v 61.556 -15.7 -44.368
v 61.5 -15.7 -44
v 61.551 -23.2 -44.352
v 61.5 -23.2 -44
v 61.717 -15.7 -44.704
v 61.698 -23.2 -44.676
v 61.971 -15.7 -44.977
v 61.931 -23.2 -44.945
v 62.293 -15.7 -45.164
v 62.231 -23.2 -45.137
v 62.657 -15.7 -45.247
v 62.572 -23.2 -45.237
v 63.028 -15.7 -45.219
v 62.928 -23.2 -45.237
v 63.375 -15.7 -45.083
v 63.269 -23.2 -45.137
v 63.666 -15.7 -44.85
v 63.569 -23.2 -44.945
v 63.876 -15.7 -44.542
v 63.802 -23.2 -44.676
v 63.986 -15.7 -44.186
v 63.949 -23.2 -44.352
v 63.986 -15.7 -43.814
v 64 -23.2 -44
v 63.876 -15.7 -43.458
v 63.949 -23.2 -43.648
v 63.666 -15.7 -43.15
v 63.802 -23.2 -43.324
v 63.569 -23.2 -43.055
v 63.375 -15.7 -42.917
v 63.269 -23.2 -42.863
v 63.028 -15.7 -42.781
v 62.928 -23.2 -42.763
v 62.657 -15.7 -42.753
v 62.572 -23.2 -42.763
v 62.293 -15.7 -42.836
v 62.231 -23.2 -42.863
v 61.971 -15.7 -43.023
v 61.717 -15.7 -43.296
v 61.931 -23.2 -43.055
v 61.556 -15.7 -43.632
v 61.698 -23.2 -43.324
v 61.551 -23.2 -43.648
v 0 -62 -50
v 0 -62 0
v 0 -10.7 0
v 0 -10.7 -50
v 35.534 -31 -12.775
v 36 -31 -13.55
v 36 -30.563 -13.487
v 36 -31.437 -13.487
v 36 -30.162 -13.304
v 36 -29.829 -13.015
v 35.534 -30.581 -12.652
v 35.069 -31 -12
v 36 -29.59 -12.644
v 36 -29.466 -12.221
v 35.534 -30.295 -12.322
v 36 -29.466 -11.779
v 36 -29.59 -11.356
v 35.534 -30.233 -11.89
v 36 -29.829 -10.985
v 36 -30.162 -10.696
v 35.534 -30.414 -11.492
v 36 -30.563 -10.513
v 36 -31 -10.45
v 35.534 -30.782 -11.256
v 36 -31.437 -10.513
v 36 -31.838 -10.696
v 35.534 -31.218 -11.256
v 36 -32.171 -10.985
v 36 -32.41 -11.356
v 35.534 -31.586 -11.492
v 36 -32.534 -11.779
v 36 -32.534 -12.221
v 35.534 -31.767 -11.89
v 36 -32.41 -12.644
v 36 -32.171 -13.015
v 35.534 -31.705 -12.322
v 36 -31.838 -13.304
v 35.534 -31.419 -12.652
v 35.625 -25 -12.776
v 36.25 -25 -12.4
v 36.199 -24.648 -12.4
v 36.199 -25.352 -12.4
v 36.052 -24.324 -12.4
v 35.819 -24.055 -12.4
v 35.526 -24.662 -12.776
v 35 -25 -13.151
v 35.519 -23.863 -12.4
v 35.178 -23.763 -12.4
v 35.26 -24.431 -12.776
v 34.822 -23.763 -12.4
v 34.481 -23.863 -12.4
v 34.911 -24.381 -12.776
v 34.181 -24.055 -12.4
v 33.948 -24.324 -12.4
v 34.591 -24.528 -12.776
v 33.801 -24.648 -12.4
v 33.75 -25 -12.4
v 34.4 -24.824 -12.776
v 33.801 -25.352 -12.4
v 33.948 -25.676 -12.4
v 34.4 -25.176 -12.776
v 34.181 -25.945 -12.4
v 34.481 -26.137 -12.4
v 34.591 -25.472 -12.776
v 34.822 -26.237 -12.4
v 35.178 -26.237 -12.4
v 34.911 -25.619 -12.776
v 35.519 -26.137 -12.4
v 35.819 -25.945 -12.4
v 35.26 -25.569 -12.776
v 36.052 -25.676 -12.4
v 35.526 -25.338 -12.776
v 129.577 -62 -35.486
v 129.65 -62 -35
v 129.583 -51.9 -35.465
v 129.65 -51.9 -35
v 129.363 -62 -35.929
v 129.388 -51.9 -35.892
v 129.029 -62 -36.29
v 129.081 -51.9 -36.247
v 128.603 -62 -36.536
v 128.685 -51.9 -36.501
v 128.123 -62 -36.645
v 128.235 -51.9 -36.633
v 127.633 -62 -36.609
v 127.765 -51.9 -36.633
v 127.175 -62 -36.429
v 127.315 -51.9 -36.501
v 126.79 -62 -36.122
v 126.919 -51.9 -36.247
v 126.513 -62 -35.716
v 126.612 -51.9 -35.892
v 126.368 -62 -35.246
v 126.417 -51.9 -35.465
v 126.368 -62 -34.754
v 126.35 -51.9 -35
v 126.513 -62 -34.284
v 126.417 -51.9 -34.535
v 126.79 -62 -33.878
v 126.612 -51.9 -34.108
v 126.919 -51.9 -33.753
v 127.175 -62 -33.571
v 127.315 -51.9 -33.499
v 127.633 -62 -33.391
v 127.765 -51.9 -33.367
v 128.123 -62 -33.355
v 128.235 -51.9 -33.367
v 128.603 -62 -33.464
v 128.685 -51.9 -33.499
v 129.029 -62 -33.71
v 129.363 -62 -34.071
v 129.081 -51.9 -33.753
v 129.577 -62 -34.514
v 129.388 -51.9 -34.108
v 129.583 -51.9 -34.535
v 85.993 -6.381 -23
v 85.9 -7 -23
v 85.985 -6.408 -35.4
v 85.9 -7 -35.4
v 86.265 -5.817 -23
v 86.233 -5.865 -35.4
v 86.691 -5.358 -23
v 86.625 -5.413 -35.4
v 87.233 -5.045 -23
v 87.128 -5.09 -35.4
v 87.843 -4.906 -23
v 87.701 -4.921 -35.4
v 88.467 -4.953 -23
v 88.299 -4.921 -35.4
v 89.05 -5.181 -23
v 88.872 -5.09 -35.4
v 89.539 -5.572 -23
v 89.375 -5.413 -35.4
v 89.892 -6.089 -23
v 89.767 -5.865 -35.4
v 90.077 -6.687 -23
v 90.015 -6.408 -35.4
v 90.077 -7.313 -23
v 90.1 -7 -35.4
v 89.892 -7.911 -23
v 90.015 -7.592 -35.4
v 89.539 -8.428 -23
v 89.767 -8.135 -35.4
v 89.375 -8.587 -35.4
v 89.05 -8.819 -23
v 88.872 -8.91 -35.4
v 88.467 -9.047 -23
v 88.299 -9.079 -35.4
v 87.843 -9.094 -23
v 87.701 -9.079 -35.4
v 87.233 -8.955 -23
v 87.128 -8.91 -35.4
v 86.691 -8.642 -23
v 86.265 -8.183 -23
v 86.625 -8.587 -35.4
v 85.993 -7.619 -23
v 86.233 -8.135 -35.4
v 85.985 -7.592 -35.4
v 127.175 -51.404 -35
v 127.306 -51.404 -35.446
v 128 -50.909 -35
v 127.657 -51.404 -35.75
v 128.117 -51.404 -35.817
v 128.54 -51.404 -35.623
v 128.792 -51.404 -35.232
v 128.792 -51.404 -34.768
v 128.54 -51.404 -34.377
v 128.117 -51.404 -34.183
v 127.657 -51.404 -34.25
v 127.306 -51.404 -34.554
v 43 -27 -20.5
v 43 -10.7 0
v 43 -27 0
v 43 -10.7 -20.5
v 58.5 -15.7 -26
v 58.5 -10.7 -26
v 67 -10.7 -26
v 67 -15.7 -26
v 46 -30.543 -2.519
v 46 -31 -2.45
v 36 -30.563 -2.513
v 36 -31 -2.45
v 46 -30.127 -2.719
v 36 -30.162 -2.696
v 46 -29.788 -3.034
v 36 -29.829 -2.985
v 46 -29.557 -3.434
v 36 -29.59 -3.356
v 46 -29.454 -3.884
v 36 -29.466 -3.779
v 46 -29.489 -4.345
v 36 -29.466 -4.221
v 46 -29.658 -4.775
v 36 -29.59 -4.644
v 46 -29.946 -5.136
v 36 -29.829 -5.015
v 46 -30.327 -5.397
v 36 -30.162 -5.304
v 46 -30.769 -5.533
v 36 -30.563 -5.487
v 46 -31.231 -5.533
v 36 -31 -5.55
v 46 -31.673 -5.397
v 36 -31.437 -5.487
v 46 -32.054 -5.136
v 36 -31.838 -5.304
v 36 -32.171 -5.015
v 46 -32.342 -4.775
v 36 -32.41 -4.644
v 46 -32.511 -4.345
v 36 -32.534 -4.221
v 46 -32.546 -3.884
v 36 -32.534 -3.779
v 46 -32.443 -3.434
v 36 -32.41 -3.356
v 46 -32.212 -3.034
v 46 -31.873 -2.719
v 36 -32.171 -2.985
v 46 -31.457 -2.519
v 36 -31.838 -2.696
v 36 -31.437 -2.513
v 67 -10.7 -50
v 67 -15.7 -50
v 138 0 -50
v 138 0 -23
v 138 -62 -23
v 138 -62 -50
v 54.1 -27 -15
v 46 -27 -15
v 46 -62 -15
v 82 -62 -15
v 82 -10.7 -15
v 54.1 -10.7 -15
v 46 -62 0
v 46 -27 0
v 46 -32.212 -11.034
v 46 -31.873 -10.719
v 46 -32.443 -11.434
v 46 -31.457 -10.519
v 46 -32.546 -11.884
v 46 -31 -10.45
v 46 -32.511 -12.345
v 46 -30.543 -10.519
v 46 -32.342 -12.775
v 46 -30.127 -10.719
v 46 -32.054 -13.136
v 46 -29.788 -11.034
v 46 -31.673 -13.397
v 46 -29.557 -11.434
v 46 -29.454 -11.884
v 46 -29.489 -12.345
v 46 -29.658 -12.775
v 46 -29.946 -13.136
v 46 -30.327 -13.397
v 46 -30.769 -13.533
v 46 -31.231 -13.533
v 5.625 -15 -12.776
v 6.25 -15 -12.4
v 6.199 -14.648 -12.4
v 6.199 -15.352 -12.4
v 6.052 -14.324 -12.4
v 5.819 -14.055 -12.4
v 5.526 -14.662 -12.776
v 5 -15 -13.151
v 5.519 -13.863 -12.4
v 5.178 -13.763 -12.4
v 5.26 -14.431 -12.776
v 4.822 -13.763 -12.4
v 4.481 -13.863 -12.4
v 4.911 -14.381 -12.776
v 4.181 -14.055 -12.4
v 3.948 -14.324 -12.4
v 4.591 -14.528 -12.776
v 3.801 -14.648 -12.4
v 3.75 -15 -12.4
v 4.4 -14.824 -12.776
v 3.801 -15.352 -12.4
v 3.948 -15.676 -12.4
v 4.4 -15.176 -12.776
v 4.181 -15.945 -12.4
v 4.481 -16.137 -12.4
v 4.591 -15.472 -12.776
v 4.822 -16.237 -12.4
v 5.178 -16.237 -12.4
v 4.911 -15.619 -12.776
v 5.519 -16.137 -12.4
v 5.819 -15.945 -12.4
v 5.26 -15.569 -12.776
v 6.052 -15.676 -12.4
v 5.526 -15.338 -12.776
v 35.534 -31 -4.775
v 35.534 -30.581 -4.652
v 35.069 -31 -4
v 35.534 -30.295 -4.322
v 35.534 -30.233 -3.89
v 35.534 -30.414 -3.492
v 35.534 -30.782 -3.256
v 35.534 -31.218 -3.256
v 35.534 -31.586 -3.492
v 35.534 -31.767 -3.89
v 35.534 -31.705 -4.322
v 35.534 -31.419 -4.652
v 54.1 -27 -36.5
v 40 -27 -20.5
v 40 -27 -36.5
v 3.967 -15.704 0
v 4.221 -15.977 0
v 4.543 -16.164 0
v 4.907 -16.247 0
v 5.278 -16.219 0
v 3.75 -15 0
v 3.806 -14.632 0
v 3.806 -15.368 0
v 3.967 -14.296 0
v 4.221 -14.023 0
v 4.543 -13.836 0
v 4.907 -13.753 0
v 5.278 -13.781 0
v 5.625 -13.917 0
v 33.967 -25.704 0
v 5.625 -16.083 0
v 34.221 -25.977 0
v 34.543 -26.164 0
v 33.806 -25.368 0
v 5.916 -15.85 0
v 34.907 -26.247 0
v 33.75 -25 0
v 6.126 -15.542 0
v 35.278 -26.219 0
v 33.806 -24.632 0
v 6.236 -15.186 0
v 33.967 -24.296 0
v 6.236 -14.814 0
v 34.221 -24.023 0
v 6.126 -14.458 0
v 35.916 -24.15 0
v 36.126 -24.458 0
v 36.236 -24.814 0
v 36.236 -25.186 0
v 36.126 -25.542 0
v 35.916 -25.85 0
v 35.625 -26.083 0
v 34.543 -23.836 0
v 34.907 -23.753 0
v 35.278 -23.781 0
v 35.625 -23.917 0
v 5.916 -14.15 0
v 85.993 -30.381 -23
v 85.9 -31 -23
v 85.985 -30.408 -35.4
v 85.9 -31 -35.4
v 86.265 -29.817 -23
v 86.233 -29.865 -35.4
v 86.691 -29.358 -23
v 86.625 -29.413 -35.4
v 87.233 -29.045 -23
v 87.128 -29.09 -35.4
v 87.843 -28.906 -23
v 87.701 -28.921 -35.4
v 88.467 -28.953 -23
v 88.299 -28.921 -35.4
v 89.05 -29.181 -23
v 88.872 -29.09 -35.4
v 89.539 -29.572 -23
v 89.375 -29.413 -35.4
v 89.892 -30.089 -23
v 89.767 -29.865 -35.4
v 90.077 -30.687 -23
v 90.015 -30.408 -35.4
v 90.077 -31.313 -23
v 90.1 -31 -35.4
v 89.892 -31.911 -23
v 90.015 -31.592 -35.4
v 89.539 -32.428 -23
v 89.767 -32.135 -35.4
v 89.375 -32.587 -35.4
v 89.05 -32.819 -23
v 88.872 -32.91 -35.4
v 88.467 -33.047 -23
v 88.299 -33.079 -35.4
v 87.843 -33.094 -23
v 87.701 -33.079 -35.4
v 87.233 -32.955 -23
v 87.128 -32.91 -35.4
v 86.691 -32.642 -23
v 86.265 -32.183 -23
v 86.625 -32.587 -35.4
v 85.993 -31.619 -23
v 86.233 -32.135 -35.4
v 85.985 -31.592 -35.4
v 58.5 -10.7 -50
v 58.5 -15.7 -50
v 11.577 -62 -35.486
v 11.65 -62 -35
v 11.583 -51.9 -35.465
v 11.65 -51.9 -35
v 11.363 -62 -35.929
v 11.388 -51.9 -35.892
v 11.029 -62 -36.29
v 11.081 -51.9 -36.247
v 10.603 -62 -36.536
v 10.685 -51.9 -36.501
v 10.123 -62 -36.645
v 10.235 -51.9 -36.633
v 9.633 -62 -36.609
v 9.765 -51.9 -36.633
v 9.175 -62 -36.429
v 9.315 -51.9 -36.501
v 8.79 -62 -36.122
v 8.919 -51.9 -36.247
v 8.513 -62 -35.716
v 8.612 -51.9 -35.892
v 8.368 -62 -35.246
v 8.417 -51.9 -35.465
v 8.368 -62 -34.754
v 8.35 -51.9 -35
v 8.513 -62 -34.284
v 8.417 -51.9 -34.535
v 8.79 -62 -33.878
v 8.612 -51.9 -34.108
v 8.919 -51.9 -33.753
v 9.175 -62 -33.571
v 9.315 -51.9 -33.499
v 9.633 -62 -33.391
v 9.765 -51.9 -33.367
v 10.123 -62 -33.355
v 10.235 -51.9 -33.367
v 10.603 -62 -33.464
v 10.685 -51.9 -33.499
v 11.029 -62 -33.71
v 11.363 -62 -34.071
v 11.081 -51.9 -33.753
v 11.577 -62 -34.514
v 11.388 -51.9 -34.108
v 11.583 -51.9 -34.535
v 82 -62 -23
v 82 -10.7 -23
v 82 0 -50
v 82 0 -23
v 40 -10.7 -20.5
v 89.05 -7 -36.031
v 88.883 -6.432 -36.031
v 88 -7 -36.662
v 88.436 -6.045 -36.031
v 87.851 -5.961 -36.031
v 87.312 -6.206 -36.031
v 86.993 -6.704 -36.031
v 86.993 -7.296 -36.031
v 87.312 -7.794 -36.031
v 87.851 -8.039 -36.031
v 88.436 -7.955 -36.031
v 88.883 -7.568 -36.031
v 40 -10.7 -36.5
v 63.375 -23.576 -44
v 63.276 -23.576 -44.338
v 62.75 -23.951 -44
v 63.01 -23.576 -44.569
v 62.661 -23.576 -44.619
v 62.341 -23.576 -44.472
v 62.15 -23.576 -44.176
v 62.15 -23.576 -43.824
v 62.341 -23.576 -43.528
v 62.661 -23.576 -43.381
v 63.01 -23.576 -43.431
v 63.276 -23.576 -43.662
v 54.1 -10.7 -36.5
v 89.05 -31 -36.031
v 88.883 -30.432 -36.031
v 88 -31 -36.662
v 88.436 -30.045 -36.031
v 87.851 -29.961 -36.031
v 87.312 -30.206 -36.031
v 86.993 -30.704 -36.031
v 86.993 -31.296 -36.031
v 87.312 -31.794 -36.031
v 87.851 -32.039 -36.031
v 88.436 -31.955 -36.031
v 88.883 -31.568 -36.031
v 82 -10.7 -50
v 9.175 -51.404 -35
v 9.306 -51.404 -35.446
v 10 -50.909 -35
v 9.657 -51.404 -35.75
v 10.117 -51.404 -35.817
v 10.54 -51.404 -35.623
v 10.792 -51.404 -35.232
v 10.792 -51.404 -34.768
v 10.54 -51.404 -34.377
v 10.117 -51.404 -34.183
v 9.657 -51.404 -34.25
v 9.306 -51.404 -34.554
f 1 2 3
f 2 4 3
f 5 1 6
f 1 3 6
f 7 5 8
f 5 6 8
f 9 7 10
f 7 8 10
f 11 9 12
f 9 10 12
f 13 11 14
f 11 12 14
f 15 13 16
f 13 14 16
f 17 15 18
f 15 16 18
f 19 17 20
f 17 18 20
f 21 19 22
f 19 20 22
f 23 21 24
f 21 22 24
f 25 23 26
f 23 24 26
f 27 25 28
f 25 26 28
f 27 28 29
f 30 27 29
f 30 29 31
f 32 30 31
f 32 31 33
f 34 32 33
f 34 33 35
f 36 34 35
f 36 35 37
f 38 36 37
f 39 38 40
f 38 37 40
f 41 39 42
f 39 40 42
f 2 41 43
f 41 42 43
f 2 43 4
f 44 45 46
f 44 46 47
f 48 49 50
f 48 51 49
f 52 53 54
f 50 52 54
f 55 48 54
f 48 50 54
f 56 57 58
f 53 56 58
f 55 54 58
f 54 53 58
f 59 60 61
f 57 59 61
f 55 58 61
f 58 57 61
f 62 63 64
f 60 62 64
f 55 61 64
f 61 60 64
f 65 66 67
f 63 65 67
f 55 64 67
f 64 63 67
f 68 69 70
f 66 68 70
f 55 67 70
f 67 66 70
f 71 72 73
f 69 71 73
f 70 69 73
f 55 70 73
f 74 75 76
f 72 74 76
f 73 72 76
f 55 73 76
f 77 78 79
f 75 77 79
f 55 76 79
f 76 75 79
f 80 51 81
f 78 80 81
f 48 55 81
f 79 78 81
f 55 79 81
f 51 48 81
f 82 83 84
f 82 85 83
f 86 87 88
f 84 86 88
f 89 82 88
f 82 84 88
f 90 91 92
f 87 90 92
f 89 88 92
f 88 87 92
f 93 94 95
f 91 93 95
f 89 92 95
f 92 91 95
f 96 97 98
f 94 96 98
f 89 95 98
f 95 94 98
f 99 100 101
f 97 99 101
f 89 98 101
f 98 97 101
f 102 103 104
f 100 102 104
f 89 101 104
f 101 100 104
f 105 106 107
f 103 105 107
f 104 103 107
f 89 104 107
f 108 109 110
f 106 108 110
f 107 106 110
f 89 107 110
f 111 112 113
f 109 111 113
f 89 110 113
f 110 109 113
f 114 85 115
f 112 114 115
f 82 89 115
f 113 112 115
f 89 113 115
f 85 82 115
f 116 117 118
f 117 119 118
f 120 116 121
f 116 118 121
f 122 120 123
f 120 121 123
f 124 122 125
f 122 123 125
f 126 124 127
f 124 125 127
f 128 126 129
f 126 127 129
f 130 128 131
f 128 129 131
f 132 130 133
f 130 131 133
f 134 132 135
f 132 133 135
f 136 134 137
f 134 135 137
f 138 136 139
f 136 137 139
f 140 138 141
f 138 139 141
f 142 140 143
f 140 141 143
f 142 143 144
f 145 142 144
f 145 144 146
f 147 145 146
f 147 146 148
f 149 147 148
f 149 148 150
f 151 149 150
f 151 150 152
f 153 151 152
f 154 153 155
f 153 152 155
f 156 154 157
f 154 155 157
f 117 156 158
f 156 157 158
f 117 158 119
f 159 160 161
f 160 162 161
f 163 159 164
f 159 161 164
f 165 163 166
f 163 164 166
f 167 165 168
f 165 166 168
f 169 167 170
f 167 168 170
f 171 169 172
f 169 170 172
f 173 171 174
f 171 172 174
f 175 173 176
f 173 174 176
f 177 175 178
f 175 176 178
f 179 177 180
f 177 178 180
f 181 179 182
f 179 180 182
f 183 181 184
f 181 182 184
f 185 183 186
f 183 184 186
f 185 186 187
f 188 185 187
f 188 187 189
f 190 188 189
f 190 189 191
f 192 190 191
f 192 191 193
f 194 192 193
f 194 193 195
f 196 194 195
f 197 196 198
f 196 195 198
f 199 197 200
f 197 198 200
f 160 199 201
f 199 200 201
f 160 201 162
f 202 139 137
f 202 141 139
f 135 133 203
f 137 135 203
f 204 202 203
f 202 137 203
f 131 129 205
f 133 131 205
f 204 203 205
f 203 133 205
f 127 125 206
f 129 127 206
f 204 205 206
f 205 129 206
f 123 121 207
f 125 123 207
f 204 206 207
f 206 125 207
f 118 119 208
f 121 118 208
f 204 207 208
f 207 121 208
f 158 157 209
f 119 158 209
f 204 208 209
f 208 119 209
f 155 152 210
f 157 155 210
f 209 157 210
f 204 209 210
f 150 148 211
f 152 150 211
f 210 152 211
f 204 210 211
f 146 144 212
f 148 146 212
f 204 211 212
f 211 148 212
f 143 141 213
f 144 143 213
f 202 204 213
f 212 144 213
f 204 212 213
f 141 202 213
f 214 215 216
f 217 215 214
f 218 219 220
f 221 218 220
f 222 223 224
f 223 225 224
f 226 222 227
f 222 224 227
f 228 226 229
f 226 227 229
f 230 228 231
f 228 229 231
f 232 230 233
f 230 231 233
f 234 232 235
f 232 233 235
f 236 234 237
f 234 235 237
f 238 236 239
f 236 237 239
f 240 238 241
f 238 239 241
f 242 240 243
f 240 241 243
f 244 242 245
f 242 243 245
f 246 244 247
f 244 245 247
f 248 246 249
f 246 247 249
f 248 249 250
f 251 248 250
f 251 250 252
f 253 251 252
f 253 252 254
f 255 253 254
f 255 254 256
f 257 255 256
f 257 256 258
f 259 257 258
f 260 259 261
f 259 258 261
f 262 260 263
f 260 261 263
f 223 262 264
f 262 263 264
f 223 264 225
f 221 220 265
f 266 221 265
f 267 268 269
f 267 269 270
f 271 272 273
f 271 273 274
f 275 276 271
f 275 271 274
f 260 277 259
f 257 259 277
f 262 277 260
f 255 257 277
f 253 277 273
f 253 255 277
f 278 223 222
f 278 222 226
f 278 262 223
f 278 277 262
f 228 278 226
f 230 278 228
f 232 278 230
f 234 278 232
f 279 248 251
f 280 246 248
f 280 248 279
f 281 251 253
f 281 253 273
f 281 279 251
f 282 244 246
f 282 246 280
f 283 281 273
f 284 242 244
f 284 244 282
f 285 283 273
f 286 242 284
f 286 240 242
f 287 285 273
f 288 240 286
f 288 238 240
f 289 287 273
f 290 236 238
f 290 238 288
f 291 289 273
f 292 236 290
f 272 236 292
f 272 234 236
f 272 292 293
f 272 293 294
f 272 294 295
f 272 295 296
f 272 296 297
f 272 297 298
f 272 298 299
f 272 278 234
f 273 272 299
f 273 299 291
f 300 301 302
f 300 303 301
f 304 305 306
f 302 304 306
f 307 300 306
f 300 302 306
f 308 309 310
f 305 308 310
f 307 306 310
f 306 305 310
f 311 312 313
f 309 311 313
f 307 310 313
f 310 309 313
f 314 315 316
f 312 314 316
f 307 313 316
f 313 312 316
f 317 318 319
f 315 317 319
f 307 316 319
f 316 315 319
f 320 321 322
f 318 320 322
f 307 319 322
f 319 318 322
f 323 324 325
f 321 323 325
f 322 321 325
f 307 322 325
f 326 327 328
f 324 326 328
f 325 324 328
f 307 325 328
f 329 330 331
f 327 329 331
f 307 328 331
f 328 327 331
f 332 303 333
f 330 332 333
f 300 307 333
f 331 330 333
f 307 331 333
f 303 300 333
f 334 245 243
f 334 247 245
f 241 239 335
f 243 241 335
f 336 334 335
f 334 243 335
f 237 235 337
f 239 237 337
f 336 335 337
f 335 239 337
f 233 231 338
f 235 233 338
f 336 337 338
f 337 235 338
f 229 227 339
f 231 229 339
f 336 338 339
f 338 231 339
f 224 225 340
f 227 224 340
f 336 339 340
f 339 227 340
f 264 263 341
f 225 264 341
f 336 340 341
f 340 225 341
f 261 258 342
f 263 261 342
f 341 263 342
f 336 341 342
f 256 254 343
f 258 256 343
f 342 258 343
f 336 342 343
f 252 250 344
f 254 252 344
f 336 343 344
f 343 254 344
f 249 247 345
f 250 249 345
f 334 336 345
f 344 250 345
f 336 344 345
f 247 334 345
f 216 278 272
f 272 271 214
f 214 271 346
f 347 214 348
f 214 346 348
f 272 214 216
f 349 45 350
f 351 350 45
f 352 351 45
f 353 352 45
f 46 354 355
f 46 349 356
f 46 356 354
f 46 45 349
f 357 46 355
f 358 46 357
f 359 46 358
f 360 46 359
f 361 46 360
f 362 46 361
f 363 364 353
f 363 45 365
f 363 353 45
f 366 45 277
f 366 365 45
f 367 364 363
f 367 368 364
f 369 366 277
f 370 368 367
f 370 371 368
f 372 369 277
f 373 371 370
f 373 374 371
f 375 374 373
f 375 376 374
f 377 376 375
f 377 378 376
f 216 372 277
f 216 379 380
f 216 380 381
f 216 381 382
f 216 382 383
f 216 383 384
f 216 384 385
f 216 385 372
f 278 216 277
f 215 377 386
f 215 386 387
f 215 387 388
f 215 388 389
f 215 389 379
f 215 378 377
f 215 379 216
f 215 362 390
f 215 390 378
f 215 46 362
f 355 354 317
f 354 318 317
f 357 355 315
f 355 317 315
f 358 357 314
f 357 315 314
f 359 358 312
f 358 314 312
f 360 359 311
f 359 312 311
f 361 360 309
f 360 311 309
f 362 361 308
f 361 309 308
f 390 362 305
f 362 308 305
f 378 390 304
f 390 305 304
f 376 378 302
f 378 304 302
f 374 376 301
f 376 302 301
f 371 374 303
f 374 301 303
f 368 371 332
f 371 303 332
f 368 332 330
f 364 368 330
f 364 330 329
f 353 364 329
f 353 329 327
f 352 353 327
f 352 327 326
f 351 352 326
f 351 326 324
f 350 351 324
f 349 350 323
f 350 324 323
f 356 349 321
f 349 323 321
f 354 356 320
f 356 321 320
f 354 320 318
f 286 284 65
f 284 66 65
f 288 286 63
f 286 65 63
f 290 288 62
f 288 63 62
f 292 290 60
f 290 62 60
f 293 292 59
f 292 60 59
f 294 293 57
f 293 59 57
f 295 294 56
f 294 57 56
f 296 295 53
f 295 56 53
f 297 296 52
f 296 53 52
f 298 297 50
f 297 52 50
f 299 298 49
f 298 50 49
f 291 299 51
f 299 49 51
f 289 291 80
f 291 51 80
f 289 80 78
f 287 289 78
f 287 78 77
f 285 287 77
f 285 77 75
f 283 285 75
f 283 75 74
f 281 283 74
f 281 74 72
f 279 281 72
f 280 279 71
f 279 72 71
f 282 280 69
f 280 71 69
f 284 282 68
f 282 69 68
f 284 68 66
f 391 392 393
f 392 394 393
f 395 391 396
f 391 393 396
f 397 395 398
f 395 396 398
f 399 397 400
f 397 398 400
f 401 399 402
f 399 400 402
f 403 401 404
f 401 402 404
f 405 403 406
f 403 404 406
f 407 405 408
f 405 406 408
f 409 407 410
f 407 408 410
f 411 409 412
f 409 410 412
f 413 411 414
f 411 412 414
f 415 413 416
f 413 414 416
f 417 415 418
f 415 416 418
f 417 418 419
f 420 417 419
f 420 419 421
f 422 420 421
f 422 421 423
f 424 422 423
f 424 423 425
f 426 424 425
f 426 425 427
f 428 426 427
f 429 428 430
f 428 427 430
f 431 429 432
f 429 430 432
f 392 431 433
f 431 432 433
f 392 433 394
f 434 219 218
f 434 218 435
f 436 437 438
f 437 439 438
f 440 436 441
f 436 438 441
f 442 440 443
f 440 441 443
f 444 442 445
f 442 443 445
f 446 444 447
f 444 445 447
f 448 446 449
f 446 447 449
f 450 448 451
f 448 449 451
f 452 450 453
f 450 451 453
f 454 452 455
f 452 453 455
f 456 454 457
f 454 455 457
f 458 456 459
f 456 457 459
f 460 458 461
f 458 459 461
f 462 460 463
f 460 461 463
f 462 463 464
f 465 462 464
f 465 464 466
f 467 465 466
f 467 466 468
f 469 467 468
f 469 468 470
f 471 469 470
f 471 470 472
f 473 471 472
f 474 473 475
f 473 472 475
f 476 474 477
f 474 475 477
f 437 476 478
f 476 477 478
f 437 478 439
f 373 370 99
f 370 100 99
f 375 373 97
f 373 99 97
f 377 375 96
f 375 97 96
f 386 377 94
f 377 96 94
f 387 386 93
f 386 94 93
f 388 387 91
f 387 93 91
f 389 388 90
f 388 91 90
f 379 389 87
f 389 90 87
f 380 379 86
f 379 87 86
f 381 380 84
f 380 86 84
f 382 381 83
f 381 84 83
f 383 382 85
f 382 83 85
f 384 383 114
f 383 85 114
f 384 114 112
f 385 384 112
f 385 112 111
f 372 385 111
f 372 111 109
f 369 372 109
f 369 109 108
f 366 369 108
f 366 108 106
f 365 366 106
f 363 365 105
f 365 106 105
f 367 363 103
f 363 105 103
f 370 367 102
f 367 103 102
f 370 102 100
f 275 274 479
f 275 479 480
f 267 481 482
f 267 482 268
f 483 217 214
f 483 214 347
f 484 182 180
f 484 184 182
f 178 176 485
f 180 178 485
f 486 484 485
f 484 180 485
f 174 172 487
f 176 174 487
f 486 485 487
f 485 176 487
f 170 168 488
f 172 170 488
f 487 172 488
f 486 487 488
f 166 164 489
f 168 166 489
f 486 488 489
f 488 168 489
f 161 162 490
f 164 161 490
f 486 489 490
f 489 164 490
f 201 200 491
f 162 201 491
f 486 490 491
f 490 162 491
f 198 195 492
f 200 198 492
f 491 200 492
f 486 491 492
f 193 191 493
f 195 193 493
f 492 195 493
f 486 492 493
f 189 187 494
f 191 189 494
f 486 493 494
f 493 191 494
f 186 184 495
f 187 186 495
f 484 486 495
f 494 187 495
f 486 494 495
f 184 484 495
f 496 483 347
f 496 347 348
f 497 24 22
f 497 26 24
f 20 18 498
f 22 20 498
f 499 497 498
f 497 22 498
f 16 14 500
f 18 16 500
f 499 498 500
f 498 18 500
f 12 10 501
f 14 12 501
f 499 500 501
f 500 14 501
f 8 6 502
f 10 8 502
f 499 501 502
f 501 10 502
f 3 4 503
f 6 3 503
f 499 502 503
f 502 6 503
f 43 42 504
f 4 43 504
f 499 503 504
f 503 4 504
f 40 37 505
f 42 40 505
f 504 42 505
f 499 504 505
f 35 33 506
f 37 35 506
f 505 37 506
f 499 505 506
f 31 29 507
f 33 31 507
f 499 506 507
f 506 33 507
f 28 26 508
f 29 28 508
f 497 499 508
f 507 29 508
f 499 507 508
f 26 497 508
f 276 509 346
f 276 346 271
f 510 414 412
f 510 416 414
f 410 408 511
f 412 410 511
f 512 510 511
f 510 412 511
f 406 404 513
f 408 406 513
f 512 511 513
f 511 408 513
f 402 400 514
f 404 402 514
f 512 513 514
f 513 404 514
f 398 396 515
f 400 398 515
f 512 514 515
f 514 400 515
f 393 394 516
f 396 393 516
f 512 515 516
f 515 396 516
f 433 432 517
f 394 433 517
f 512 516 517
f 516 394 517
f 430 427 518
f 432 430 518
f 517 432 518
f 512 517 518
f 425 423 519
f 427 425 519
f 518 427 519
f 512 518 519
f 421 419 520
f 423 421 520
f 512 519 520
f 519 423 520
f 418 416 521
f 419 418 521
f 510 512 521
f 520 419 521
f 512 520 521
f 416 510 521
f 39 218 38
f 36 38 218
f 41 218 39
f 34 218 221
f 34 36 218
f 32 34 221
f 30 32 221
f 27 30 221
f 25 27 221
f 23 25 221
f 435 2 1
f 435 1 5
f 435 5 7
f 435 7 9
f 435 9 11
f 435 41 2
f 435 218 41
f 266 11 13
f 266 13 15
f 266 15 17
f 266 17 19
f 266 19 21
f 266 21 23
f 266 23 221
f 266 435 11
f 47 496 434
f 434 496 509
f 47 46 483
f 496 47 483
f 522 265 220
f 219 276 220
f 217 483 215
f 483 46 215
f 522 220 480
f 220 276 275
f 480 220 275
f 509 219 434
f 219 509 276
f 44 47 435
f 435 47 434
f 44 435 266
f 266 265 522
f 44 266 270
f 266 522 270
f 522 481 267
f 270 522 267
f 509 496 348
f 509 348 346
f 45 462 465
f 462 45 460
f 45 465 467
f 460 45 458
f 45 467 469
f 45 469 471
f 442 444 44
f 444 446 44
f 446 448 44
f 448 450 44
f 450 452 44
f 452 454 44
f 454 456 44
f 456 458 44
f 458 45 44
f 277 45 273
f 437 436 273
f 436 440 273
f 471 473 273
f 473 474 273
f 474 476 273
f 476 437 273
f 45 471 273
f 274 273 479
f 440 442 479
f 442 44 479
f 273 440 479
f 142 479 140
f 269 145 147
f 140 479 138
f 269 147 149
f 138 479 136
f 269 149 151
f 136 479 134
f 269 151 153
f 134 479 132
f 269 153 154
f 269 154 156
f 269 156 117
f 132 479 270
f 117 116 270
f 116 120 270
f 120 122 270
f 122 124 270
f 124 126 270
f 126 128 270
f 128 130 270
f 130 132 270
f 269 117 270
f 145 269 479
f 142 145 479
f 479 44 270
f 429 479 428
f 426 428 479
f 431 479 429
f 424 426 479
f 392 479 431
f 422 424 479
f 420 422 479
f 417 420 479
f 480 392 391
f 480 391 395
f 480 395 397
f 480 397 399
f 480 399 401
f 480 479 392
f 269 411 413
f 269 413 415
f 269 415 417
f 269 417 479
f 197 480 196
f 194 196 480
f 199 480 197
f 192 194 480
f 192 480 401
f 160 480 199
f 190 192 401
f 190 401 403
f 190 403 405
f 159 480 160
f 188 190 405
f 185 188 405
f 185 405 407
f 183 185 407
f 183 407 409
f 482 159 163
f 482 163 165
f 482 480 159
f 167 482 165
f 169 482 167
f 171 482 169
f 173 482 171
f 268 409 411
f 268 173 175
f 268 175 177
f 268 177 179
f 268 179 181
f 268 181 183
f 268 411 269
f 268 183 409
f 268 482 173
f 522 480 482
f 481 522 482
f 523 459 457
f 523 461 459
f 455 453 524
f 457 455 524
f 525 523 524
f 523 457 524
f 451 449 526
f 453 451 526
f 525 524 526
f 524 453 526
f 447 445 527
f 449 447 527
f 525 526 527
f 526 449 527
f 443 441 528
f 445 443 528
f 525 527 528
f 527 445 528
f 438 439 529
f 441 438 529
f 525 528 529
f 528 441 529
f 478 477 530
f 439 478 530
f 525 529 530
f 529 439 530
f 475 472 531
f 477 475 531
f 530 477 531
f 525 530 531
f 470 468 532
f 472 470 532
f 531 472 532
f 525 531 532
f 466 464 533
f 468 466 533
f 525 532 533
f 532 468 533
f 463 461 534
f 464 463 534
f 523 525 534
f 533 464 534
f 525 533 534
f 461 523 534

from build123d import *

# Parameters (mm, degrees)
SKETCH1_W                      = 138
SKETCH1_H                      = 50
BOSS_EXTRUDE1_DEPTH            = 62
SKETCH2_W                      = 82
SKETCH2_H                      = 8
CUT_EXTRUDE1_DEPTH             = 160.336122709
SKETCH3_W                      = 56
SKETCH3_H                      = 62
CUT_EXTRUDE2_DEPTH             = 23
CUT_EXTRUDE3_DEPTH             = 19
SKETCH5_W                      = 36
SKETCH5_H                      = 15
CUT_EXTRUDE4_DEPTH             = 157.396930916
M3X0_5_TAPPED_HOLE1_D          = 2.5
M3X0_5_TAPPED_HOLE1_DEPTH      = 12.4
M3X0_5_TAPPED_HOLE1_TIP        = 0.751075774
M4X0_7_TAPPED_HOLE1_D          = 3.3
M4X0_7_TAPPED_HOLE1_DEPTH      = 10.1
M4X0_7_TAPPED_HOLE1_TIP        = 0.991420021
F_3_1_3_1_DIAMETER_HOLE1_D     = 3.1
F_3_1_3_1_DIAMETER_HOLE1_DEPTH = 10
F_3_1_3_1_DIAMETER_HOLE1_TIP   = 0.931333959
SKETCH15_W                     = 82
SKETCH15_H                     = 2.7
CUT_EXTRUDE6_DEPTH             = 160.336122709
SKETCH16_W                     = 8.5
SKETCH16_H                     = 24
CUT_EXTRUDE7_DEPTH             = 5
M3X0_5_TAPPED_HOLE2_D          = 2.5
M3X0_5_TAPPED_HOLE2_DEPTH      = 7.5
M3X0_5_TAPPED_HOLE2_TIP        = 0.751075774
M5X0_8_TAPPED_HOLE1_D          = 4.2
M5X0_8_TAPPED_HOLE1_DEPTH      = 12.4
M5X0_8_TAPPED_HOLE1_TIP        = 1.2618073


with BuildPart() as part:
    # Sketch1 → Boss-Extrude1 (new body)
    with BuildSketch(Plane(origin=(0, 0, 0), x_dir=(1, 0, 0), z_dir=(0, 1, 0))):
        with Locations((69, 25)):
            Rectangle(SKETCH1_W, SKETCH1_H)
    extrude(amount=-BOSS_EXTRUDE1_DEPTH)

    # Sketch2 → Cut-Extrude1 (cut, through all)
    with BuildSketch(Plane.XY):
        with Locations((41, -4)):
            Rectangle(SKETCH2_W, SKETCH2_H)
    extrude(amount=-CUT_EXTRUDE1_DEPTH, mode=Mode.SUBTRACT)

    # Sketch3 → Cut-Extrude2 (cut)
    with BuildSketch(Plane.XY):
        with Locations((110, -31)):
            Rectangle(SKETCH3_W, SKETCH3_H)
    extrude(amount=-CUT_EXTRUDE2_DEPTH, mode=Mode.SUBTRACT)

    # Sketch4 → Cut-Extrude3 (cut)
    with BuildSketch(Plane(origin=(0, -8, 0), x_dir=(1, 0, 0), z_dir=(0, 1, 0))):
        Polygon((40, 36.5), (54.1, 36.5), (54.1, 0), (43, 0), (43, 20.5), (40, 20.5), align=None)
    extrude(amount=-CUT_EXTRUDE3_DEPTH, mode=Mode.SUBTRACT)

    # Sketch5 → Cut-Extrude4 (cut, through all)
    with BuildSketch(Plane(origin=(0, -8, 0), x_dir=(1, 0, 0), z_dir=(0, 1, 0))):
        with Locations((64, 7.5)):
            Rectangle(SKETCH5_W, SKETCH5_H)
    extrude(amount=-CUT_EXTRUDE4_DEPTH, mode=Mode.SUBTRACT)

    # M3x0.5 Tapped Hole1
    with Locations(Plane.XY):
        with Locations((5, -15), (35, -25)):
            Hole(M3X0_5_TAPPED_HOLE1_D / 2, depth=M3X0_5_TAPPED_HOLE1_DEPTH)
            with Locations((0, 0, -(M3X0_5_TAPPED_HOLE1_DEPTH + M3X0_5_TAPPED_HOLE1_TIP / 2))):  # 118° drill point
                Cone(0, M3X0_5_TAPPED_HOLE1_D / 2, M3X0_5_TAPPED_HOLE1_TIP, mode=Mode.SUBTRACT)

    # M4x0.7 Tapped Hole1
    with Locations(Plane(origin=(0, -62, 0), x_dir=(-1, 0, 0), z_dir=(0, -1, 0))):
        with Locations((-128, 35), (-10, 35)):
            Hole(M4X0_7_TAPPED_HOLE1_D / 2, depth=M4X0_7_TAPPED_HOLE1_DEPTH)
            with Locations((0, 0, -(M4X0_7_TAPPED_HOLE1_DEPTH + M4X0_7_TAPPED_HOLE1_TIP / 2))):  # 118° drill point
                Cone(0, M4X0_7_TAPPED_HOLE1_D / 2, M4X0_7_TAPPED_HOLE1_TIP, mode=Mode.SUBTRACT)

    # Ø3.1 (3.1) Diameter Hole1
    with Locations(Plane(origin=(46, 0, 0), x_dir=(0, 0, -1), z_dir=(1, 0, 0))):
        with Locations((4, -31), (12, -31)):
            Hole(F_3_1_3_1_DIAMETER_HOLE1_D / 2, depth=F_3_1_3_1_DIAMETER_HOLE1_DEPTH)
            with Locations((0, 0, -(F_3_1_3_1_DIAMETER_HOLE1_DEPTH + F_3_1_3_1_DIAMETER_HOLE1_TIP / 2))):  # 118° drill point
                Cone(0, F_3_1_3_1_DIAMETER_HOLE1_D / 2, F_3_1_3_1_DIAMETER_HOLE1_TIP, mode=Mode.SUBTRACT)

    # Sketch15 → Cut-Extrude6 (cut, through all)
    with BuildSketch(Plane.XY):
        with Locations((41, -9.35)):
            Rectangle(SKETCH15_W, SKETCH15_H)
    extrude(amount=-CUT_EXTRUDE6_DEPTH, mode=Mode.SUBTRACT)

    # Sketch16 → Cut-Extrude7 (cut)
    with BuildSketch(Plane(origin=(0, -10.7, 0), x_dir=(1, 0, 0), z_dir=(0, 1, 0))):
        with Locations((62.75, 38)):
            Rectangle(SKETCH16_W, SKETCH16_H)
    extrude(amount=-CUT_EXTRUDE7_DEPTH, mode=Mode.SUBTRACT)

    # M3x0.5 Tapped Hole2
    with Locations(Plane(origin=(0, -15.7, 0), x_dir=(1, 0, 0), z_dir=(0, 1, 0))):
        with Locations((62.75, 44)):
            Hole(M3X0_5_TAPPED_HOLE2_D / 2, depth=M3X0_5_TAPPED_HOLE2_DEPTH)
            with Locations((0, 0, -(M3X0_5_TAPPED_HOLE2_DEPTH + M3X0_5_TAPPED_HOLE2_TIP / 2))):  # 118° drill point
                Cone(0, M3X0_5_TAPPED_HOLE2_D / 2, M3X0_5_TAPPED_HOLE2_TIP, mode=Mode.SUBTRACT)

    # M5x0.8 Tapped Hole1
    with Locations(Plane.XY.offset(-23)):
        with Locations((88, -7), (88, -31)):
            Hole(M5X0_8_TAPPED_HOLE1_D / 2, depth=M5X0_8_TAPPED_HOLE1_DEPTH)
            with Locations((0, 0, -(M5X0_8_TAPPED_HOLE1_DEPTH + M5X0_8_TAPPED_HOLE1_TIP / 2))):  # 118° drill point
                Cone(0, M5X0_8_TAPPED_HOLE1_D / 2, M5X0_8_TAPPED_HOLE1_TIP, mode=Mode.SUBTRACT)


solid = part.part
